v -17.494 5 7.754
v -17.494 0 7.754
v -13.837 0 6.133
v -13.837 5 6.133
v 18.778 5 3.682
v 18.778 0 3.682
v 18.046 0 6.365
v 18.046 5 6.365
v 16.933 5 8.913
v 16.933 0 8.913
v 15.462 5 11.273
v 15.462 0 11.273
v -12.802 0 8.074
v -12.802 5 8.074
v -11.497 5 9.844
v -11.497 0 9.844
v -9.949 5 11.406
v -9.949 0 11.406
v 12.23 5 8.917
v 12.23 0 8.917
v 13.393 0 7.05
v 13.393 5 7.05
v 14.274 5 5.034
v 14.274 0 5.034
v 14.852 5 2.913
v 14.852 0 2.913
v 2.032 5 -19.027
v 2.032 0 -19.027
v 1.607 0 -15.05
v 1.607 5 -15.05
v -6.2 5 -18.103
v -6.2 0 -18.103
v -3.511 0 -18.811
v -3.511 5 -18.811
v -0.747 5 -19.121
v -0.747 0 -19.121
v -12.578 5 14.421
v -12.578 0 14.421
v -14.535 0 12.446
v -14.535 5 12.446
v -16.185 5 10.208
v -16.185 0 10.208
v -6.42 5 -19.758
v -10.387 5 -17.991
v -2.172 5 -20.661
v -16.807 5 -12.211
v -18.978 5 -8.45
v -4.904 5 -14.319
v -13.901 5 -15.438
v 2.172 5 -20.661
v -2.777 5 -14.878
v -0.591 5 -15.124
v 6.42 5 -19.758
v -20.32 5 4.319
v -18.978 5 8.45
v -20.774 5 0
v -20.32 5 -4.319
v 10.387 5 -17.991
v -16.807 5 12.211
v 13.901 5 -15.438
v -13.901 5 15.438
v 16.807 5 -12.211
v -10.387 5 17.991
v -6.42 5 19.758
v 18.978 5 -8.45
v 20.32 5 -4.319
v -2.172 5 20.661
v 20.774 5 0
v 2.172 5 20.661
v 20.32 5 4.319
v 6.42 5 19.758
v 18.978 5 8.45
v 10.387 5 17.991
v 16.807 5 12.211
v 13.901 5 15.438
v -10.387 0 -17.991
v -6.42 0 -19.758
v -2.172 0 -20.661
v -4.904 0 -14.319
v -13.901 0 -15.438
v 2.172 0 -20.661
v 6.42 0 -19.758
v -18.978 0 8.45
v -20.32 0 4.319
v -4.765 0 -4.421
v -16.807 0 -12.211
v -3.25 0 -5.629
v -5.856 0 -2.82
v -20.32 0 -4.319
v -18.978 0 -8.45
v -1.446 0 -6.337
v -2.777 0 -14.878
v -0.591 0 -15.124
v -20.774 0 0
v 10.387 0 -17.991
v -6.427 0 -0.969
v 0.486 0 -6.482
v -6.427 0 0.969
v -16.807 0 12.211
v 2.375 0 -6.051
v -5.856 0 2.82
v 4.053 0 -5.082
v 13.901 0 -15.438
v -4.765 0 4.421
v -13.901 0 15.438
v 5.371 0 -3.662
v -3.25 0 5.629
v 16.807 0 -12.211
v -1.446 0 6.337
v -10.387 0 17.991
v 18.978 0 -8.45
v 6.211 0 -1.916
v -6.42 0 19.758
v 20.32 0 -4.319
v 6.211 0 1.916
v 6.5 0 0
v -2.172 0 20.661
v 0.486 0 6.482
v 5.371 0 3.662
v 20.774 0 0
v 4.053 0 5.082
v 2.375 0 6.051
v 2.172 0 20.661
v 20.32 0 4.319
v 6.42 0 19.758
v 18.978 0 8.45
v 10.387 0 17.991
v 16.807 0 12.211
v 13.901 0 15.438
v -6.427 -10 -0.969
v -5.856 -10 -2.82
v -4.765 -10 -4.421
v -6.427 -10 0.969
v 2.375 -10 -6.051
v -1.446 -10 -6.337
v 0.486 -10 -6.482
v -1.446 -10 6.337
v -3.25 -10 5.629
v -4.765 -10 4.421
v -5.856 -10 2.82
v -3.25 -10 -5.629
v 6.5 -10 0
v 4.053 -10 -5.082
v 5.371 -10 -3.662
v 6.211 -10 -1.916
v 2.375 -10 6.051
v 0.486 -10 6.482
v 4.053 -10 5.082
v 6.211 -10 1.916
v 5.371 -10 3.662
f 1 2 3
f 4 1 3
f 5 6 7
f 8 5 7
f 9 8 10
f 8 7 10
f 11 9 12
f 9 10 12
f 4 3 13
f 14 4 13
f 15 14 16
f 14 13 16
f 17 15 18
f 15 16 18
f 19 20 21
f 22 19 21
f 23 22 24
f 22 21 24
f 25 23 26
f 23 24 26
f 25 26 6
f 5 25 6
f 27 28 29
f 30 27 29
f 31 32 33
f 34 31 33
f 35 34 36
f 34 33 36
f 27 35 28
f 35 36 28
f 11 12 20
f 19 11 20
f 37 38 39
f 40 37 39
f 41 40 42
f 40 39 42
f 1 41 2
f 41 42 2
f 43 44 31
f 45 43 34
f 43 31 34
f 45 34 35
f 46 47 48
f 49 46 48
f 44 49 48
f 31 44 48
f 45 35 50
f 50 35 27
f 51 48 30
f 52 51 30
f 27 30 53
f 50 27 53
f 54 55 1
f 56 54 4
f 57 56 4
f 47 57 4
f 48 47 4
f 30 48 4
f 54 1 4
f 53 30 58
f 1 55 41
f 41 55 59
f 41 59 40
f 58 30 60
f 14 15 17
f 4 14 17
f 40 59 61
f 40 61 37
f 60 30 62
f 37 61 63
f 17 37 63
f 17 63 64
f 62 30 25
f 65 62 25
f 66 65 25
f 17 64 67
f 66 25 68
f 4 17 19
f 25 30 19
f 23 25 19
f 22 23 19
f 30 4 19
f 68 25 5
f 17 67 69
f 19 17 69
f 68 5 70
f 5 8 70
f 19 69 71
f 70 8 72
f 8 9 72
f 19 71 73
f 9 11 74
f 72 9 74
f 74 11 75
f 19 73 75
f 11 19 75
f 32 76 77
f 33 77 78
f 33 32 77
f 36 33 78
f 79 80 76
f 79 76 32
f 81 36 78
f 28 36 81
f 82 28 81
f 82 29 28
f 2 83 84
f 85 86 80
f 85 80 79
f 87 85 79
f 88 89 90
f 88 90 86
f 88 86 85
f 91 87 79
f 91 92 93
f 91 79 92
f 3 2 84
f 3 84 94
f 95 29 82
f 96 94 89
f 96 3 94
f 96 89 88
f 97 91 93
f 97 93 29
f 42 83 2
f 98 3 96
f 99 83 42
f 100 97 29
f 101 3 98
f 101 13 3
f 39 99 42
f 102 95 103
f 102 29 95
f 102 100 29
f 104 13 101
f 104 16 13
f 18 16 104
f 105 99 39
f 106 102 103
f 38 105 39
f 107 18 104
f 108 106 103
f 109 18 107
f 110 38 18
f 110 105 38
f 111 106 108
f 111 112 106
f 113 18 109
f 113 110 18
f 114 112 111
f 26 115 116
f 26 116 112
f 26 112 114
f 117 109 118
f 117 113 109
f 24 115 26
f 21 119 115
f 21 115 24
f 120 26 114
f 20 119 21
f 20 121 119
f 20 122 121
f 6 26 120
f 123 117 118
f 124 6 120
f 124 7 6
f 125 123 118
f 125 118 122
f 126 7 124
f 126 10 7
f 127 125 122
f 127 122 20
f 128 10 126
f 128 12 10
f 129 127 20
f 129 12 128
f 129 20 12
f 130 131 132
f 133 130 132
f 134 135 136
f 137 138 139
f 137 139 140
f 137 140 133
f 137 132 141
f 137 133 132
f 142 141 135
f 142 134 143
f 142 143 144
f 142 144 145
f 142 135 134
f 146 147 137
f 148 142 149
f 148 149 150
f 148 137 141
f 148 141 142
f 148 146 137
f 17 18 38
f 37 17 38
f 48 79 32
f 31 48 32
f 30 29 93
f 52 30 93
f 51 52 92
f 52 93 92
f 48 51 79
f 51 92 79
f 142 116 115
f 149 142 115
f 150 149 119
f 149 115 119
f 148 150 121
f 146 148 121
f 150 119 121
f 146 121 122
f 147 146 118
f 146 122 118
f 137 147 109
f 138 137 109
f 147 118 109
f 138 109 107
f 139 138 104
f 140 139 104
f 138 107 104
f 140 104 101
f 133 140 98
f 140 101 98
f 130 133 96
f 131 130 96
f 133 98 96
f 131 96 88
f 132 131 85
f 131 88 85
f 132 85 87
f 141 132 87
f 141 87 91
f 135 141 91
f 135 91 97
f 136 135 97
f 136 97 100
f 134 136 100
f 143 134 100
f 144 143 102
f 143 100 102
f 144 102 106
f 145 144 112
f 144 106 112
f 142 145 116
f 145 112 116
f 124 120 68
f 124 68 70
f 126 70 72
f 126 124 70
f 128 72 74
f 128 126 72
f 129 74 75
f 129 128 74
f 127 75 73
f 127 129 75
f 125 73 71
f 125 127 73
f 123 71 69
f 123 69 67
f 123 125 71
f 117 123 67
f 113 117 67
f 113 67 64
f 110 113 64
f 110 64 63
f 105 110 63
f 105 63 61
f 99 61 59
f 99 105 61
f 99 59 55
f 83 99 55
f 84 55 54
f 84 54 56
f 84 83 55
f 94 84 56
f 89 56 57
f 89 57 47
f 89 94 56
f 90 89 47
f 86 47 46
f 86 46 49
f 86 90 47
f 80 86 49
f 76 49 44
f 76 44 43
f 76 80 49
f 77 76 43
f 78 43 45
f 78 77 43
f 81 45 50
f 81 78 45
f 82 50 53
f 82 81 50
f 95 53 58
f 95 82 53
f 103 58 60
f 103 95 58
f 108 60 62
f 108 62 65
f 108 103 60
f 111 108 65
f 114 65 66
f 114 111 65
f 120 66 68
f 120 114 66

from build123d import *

# Parameters (mm, degrees)
F0_R     = 6.5
F1_DEPTH = 10
F2_R     = 20.7743809462
F3_DEPTH = 5
F5_DEPTH = 25


with BuildPart() as f1:
    # F0 (on Front) → F1 (new body)
    with BuildSketch(Plane.XZ):
        Circle(F0_R)
    extrude(amount=F1_DEPTH)

    # F2 (on Front) → F3 (join)
    with BuildSketch(Plane.XZ):
        Circle(F2_R)
    extrude(amount=-F3_DEPTH)

    # F4 (on face) → F5 (cut)
    with BuildSketch(Plane.XZ):
        with BuildLine():
            Line((-9.9486096802, 11.406318953), (-12.577847041, 14.4208024743))
            ThreePointArc((-12.577847041, 14.4208024743), (-15.4009347645, 11.3566275174), (-17.493895192, 7.7540577249))
            Line((-17.493895192, 7.7540577249), (-13.8370211121, 6.1331715588))
            ThreePointArc((-13.8370211121, 6.1331715588), (-12.1815671778, 8.9826704114), (-9.9486096802, 11.406318953))
        make_face()
        with BuildLine():
            Line((14.8524668171, 2.9125892389), (18.7777048063, 3.6823338253))
            ThreePointArc((18.7777048063, 3.6823338253), (17.5355953137, 7.6592869894), (15.4621585682, 11.273128785))
            Line((15.4621585682, 11.273128785), (12.2299929317, 8.9166260164))
            ThreePointArc((12.2299929317, 8.9166260164), (13.870004359, 6.0582114282), (14.8524668171, 2.9125892389))
        make_face()
        with BuildLine():
            ThreePointArc((-6.1998577652, -18.1031362996), (-2.1346605491, -19.0159145068), (2.0317366238, -19.0271865099))
            Line((2.0317366238, -19.0271865099), (1.6070281804, -15.0497975752))
            ThreePointArc((1.6070281804, -15.0497975752), (-1.6884371812, -15.0408818396), (-4.9038571369, -14.3189081919))
            Line((-4.9038571369, -14.3189081919), (-6.1998577652, -18.1031362996))
        make_face()
    extrude(amount=-F5_DEPTH, mode=Mode.SUBTRACT)


solid = f1.part
